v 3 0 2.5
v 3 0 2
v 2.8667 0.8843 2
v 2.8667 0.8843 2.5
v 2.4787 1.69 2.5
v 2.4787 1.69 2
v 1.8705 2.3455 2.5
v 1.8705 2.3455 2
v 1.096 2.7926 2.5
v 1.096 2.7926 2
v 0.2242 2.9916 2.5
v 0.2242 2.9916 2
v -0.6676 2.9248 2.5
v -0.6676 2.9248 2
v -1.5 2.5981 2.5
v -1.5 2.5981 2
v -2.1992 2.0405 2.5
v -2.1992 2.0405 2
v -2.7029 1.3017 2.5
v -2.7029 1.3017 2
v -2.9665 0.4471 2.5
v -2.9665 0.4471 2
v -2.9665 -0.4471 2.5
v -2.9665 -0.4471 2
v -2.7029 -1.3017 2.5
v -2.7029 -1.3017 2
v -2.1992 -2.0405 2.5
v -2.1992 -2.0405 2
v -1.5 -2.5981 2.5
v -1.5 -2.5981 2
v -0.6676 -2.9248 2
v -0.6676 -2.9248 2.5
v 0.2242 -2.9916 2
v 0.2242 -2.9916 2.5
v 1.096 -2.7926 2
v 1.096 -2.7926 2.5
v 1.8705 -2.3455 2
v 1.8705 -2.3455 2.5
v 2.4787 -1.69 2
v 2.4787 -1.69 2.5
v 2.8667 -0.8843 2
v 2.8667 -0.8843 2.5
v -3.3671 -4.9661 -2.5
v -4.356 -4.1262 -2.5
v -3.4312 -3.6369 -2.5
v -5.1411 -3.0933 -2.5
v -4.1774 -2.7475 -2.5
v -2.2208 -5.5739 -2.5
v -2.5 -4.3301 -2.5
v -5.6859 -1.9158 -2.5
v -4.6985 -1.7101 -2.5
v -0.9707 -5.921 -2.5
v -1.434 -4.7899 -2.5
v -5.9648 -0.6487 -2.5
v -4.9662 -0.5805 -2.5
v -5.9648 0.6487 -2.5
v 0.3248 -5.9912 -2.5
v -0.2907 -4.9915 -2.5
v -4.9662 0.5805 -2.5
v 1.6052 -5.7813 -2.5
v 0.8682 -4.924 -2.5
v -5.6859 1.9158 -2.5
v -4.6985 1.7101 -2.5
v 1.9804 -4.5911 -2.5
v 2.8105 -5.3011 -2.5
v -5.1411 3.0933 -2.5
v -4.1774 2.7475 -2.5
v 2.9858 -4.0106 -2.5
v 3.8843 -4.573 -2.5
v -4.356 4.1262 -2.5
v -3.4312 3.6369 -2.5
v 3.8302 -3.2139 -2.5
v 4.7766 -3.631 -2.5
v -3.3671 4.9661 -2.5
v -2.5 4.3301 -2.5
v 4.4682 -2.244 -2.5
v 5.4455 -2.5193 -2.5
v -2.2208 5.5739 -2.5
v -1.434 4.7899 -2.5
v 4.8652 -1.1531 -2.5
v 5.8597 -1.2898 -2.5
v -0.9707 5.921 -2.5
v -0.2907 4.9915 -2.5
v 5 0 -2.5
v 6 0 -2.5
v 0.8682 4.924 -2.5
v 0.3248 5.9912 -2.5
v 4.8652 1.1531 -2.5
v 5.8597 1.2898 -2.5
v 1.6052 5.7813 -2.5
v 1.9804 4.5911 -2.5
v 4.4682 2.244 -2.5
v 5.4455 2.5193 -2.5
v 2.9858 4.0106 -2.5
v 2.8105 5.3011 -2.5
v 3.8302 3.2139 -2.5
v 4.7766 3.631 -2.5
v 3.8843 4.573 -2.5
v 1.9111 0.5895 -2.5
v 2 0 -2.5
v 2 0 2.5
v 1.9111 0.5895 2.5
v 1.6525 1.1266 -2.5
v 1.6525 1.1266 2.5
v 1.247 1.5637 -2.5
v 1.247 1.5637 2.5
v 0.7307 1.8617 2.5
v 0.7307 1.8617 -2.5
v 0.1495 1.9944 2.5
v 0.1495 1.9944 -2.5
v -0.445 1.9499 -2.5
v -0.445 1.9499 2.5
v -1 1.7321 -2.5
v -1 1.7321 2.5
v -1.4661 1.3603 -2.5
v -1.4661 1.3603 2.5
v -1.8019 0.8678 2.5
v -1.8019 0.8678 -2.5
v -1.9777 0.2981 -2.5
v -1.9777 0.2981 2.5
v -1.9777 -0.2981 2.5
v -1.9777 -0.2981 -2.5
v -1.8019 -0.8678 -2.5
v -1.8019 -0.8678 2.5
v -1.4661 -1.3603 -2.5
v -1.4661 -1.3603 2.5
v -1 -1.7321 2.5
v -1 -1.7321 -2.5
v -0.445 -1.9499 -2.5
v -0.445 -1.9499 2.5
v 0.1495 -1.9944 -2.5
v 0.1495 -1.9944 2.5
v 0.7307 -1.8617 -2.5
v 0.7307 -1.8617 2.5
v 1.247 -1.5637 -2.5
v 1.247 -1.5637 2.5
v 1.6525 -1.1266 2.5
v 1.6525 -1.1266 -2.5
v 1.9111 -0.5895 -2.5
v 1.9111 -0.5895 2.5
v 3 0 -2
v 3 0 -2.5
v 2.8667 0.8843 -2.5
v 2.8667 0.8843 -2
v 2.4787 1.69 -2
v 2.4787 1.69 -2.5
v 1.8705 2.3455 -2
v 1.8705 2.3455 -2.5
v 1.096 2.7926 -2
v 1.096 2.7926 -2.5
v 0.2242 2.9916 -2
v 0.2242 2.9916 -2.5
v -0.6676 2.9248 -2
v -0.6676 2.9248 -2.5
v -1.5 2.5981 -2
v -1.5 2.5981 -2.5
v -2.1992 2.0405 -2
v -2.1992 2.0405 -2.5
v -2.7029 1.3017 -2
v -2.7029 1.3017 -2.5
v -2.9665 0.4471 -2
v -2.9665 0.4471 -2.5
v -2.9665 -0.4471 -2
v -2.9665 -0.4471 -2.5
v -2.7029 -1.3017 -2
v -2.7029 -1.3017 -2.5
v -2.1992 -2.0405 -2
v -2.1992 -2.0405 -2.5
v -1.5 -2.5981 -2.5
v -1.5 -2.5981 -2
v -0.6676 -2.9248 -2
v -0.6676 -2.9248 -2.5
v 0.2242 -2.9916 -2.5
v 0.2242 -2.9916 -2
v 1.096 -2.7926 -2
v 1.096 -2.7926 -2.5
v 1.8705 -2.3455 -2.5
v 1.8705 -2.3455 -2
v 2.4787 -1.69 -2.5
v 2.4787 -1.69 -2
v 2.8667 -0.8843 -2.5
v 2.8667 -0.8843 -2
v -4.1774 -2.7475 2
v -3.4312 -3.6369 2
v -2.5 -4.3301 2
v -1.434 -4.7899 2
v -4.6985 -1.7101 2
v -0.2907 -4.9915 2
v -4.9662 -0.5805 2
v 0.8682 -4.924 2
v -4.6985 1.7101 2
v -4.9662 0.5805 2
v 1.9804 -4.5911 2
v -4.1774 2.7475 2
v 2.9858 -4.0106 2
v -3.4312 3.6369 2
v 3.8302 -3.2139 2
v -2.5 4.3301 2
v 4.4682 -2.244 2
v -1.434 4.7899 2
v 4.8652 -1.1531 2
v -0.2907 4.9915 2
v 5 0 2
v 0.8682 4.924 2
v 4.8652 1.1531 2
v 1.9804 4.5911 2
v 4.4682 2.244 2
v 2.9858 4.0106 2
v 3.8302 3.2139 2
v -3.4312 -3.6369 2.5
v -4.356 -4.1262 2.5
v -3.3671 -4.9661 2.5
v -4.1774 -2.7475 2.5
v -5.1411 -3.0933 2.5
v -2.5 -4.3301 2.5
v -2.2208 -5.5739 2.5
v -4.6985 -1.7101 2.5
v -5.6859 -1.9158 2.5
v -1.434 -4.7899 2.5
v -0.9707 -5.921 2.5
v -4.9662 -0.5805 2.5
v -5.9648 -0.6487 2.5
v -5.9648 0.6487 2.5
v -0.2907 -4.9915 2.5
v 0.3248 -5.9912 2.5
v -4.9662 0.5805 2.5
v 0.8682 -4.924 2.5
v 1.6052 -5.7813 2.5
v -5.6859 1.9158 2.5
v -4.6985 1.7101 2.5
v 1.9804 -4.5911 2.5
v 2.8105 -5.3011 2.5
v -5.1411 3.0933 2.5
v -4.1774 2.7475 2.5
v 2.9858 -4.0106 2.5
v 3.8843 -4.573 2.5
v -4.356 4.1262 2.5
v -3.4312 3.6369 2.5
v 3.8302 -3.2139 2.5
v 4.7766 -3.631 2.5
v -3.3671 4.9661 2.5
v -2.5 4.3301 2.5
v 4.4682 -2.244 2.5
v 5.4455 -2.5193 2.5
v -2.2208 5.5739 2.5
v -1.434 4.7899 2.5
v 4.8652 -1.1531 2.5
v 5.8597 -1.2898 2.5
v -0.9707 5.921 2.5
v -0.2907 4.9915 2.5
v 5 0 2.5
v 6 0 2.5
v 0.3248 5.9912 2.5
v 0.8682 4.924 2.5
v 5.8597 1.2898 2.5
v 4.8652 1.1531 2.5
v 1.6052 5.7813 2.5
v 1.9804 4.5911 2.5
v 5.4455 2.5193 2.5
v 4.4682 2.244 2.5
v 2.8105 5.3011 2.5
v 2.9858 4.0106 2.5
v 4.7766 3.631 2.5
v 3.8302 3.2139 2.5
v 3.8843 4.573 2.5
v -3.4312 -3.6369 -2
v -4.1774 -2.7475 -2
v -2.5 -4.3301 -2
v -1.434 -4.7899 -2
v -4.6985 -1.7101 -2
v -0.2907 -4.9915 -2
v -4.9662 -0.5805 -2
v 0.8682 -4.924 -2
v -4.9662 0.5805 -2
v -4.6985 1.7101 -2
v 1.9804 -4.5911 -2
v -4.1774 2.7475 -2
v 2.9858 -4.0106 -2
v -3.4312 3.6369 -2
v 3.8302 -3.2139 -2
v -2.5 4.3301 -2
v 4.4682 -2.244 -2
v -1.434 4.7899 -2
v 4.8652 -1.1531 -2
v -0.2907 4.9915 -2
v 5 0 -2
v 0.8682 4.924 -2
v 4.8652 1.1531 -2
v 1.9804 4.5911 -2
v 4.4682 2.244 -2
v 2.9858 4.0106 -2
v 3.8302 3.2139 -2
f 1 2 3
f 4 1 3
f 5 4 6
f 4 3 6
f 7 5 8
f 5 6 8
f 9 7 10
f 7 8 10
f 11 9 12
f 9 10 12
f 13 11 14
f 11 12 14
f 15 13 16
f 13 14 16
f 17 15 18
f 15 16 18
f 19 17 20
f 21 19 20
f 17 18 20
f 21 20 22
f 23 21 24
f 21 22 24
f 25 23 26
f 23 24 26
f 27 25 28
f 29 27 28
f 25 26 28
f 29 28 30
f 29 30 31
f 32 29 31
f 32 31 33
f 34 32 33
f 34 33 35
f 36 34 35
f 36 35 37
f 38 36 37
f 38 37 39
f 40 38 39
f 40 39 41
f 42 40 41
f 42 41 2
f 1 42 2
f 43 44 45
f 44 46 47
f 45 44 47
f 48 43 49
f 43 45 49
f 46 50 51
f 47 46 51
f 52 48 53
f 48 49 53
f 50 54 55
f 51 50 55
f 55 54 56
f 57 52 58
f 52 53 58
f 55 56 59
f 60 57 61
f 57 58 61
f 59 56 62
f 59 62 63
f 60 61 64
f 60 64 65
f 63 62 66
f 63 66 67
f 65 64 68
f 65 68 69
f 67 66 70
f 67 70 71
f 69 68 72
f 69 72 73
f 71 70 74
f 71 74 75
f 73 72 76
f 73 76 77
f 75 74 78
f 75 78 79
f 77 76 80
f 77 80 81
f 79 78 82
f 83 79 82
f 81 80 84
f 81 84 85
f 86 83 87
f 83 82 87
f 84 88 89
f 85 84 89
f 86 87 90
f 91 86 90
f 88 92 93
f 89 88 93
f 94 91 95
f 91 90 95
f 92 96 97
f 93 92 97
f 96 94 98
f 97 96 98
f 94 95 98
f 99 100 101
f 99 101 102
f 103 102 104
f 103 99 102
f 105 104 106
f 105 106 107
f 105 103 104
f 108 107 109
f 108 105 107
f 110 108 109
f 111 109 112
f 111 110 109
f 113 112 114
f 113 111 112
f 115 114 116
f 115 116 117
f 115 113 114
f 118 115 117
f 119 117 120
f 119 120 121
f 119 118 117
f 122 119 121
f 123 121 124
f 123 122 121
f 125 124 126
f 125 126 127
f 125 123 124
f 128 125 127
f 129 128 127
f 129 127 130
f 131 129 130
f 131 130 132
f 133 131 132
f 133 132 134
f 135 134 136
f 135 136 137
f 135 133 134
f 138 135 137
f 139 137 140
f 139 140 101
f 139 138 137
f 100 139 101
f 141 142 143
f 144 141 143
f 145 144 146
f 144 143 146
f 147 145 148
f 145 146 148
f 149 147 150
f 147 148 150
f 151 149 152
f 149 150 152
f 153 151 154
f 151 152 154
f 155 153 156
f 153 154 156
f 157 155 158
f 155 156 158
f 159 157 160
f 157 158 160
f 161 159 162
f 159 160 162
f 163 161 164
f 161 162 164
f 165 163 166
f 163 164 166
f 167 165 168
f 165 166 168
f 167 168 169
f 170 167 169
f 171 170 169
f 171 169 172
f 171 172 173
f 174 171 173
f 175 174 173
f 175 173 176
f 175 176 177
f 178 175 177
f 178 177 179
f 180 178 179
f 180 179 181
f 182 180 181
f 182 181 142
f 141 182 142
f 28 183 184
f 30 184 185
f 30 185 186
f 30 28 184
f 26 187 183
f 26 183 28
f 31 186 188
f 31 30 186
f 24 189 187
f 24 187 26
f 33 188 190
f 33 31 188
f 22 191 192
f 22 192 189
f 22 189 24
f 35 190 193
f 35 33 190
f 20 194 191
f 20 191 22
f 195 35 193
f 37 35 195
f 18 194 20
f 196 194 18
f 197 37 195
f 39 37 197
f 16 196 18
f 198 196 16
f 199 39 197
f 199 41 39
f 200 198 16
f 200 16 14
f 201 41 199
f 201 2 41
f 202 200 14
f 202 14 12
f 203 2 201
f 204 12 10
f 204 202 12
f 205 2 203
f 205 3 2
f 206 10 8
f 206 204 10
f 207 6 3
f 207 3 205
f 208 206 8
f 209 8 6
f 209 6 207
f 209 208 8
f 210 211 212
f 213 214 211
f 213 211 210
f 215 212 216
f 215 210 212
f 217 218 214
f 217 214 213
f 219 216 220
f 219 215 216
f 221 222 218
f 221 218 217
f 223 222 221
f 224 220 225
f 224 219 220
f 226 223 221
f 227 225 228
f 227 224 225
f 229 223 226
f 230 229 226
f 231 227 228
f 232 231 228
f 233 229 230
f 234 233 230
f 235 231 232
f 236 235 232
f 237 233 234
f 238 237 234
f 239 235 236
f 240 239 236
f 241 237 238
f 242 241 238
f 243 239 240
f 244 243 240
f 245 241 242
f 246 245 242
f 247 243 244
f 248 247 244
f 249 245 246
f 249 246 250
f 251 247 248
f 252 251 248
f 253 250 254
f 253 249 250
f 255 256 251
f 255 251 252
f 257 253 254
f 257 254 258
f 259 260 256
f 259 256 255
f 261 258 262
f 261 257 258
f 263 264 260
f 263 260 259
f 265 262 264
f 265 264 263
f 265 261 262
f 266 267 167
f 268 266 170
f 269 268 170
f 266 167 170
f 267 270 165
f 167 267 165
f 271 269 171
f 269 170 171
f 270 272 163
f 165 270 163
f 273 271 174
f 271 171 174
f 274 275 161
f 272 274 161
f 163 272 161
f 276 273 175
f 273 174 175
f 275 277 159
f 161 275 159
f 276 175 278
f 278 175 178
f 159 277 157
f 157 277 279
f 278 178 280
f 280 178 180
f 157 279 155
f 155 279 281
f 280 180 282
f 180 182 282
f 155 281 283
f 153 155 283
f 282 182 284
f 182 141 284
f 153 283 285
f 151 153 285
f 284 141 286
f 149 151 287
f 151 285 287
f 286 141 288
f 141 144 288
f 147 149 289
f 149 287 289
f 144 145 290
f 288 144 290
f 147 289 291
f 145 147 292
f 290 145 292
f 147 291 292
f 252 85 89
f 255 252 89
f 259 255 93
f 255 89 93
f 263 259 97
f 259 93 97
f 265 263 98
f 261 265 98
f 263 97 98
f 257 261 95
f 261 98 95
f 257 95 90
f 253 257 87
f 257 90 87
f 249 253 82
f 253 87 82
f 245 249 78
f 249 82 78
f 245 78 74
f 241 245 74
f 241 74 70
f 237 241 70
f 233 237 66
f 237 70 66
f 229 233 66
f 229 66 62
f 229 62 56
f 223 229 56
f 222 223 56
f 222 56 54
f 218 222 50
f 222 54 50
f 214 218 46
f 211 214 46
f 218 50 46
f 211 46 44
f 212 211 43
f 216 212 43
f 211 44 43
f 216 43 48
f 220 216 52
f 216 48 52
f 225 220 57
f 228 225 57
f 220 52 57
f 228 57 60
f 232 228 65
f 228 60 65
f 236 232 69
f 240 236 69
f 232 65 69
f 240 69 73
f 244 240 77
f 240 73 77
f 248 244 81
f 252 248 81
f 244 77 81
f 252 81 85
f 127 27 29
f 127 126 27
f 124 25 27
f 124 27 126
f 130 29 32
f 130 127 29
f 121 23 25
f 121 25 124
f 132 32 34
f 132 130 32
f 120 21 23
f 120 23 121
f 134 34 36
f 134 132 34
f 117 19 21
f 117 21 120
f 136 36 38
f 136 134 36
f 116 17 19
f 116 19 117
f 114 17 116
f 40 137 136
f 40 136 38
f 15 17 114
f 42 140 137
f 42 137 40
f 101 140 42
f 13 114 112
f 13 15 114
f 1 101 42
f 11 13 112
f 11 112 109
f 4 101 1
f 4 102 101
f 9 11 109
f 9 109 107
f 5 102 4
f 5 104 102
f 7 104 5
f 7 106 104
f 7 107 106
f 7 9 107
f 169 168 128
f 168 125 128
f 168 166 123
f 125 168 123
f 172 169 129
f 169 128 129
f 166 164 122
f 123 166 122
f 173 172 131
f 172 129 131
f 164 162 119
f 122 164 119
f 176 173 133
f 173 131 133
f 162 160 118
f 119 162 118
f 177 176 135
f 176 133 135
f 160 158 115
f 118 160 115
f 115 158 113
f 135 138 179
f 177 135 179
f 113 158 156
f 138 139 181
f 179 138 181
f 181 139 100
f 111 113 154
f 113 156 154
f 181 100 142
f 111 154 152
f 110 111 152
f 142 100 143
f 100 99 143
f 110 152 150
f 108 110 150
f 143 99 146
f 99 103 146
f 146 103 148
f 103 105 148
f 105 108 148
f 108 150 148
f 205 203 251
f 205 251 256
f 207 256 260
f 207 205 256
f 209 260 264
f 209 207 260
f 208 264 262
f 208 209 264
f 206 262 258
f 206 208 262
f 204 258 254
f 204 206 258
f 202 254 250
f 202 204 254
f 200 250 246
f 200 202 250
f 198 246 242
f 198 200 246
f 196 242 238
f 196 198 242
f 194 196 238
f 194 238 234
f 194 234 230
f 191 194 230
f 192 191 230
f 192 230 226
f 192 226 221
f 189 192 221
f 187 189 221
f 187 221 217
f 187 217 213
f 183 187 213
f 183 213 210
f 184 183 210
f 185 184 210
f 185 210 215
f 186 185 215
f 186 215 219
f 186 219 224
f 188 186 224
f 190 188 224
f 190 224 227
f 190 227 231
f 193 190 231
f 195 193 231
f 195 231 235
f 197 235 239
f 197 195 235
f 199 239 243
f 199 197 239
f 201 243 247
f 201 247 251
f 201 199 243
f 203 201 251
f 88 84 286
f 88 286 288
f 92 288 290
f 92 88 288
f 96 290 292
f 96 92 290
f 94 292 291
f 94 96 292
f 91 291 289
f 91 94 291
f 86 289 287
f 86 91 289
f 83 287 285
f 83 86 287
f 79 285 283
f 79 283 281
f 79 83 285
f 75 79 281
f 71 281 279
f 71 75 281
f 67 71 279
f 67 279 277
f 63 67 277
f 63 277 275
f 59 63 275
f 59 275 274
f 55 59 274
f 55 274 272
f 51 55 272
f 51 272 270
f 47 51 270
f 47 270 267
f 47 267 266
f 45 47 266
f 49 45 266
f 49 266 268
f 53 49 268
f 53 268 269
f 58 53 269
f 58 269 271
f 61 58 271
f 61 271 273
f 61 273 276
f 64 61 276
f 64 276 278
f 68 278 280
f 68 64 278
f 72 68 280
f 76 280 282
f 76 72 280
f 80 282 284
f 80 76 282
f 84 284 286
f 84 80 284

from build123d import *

# Parameters (mm, degrees)
SALIENTE_EXTRUIR2_DEPTH        = 2.5
SALIENTE_EXTRUIR2_DEPTH_BACK   = 2.5
CROQUIS1_R                     = 6
CROQUIS1_R_2                   = 5
SALIENTE_EXTRUIR2_2_DEPTH      = 2.5
SALIENTE_EXTRUIR2_2_DEPTH_BACK = 2.5
CROQUIS1_R_3                   = 3
CROQUIS1_R_4                   = 2
SALIENTE_EXTRUIR3_DEPTH        = 2
SALIENTE_EXTRUIR3_DEPTH_BACK   = 2
CROQUIS1_3_R                   = 5
CROQUIS1_3_R_2                 = 3


with BuildPart() as part:
    # Croquis1 → Saliente-Extruir2 (new, two sides: drawn at the far end of the back side and taken through both)
    with BuildSketch(Plane.XY.offset(-SALIENTE_EXTRUIR2_DEPTH_BACK)):
        Circle(CROQUIS1_R)
        Circle(CROQUIS1_R_2, mode=Mode.SUBTRACT)
    extrude(amount=SALIENTE_EXTRUIR2_DEPTH + SALIENTE_EXTRUIR2_DEPTH_BACK)



with BuildPart() as body_2:
    # Croquis1 → Saliente-Extruir2 2 (new, two sides: drawn at the far end of the back side and taken through both)
    with BuildSketch(Plane.XY.offset(-SALIENTE_EXTRUIR2_2_DEPTH_BACK)):
        Circle(CROQUIS1_R_3)
        Circle(CROQUIS1_R_4, mode=Mode.SUBTRACT)
    extrude(amount=SALIENTE_EXTRUIR2_2_DEPTH + SALIENTE_EXTRUIR2_2_DEPTH_BACK)


with BuildPart() as part_1:
    add(part.part)

    add(body_2.part)  # Saliente-Extruir3 merges body 2
    # Croquis1<3> → Saliente-Extruir3 (add, two sides: drawn at the far end of the back side and taken through both)
    with BuildSketch(Plane.XY.offset(-SALIENTE_EXTRUIR3_DEPTH_BACK)):
        Circle(CROQUIS1_3_R)
        Circle(CROQUIS1_3_R_2, mode=Mode.SUBTRACT)
    extrude(amount=SALIENTE_EXTRUIR3_DEPTH + SALIENTE_EXTRUIR3_DEPTH_BACK)


solid = part_1.part
